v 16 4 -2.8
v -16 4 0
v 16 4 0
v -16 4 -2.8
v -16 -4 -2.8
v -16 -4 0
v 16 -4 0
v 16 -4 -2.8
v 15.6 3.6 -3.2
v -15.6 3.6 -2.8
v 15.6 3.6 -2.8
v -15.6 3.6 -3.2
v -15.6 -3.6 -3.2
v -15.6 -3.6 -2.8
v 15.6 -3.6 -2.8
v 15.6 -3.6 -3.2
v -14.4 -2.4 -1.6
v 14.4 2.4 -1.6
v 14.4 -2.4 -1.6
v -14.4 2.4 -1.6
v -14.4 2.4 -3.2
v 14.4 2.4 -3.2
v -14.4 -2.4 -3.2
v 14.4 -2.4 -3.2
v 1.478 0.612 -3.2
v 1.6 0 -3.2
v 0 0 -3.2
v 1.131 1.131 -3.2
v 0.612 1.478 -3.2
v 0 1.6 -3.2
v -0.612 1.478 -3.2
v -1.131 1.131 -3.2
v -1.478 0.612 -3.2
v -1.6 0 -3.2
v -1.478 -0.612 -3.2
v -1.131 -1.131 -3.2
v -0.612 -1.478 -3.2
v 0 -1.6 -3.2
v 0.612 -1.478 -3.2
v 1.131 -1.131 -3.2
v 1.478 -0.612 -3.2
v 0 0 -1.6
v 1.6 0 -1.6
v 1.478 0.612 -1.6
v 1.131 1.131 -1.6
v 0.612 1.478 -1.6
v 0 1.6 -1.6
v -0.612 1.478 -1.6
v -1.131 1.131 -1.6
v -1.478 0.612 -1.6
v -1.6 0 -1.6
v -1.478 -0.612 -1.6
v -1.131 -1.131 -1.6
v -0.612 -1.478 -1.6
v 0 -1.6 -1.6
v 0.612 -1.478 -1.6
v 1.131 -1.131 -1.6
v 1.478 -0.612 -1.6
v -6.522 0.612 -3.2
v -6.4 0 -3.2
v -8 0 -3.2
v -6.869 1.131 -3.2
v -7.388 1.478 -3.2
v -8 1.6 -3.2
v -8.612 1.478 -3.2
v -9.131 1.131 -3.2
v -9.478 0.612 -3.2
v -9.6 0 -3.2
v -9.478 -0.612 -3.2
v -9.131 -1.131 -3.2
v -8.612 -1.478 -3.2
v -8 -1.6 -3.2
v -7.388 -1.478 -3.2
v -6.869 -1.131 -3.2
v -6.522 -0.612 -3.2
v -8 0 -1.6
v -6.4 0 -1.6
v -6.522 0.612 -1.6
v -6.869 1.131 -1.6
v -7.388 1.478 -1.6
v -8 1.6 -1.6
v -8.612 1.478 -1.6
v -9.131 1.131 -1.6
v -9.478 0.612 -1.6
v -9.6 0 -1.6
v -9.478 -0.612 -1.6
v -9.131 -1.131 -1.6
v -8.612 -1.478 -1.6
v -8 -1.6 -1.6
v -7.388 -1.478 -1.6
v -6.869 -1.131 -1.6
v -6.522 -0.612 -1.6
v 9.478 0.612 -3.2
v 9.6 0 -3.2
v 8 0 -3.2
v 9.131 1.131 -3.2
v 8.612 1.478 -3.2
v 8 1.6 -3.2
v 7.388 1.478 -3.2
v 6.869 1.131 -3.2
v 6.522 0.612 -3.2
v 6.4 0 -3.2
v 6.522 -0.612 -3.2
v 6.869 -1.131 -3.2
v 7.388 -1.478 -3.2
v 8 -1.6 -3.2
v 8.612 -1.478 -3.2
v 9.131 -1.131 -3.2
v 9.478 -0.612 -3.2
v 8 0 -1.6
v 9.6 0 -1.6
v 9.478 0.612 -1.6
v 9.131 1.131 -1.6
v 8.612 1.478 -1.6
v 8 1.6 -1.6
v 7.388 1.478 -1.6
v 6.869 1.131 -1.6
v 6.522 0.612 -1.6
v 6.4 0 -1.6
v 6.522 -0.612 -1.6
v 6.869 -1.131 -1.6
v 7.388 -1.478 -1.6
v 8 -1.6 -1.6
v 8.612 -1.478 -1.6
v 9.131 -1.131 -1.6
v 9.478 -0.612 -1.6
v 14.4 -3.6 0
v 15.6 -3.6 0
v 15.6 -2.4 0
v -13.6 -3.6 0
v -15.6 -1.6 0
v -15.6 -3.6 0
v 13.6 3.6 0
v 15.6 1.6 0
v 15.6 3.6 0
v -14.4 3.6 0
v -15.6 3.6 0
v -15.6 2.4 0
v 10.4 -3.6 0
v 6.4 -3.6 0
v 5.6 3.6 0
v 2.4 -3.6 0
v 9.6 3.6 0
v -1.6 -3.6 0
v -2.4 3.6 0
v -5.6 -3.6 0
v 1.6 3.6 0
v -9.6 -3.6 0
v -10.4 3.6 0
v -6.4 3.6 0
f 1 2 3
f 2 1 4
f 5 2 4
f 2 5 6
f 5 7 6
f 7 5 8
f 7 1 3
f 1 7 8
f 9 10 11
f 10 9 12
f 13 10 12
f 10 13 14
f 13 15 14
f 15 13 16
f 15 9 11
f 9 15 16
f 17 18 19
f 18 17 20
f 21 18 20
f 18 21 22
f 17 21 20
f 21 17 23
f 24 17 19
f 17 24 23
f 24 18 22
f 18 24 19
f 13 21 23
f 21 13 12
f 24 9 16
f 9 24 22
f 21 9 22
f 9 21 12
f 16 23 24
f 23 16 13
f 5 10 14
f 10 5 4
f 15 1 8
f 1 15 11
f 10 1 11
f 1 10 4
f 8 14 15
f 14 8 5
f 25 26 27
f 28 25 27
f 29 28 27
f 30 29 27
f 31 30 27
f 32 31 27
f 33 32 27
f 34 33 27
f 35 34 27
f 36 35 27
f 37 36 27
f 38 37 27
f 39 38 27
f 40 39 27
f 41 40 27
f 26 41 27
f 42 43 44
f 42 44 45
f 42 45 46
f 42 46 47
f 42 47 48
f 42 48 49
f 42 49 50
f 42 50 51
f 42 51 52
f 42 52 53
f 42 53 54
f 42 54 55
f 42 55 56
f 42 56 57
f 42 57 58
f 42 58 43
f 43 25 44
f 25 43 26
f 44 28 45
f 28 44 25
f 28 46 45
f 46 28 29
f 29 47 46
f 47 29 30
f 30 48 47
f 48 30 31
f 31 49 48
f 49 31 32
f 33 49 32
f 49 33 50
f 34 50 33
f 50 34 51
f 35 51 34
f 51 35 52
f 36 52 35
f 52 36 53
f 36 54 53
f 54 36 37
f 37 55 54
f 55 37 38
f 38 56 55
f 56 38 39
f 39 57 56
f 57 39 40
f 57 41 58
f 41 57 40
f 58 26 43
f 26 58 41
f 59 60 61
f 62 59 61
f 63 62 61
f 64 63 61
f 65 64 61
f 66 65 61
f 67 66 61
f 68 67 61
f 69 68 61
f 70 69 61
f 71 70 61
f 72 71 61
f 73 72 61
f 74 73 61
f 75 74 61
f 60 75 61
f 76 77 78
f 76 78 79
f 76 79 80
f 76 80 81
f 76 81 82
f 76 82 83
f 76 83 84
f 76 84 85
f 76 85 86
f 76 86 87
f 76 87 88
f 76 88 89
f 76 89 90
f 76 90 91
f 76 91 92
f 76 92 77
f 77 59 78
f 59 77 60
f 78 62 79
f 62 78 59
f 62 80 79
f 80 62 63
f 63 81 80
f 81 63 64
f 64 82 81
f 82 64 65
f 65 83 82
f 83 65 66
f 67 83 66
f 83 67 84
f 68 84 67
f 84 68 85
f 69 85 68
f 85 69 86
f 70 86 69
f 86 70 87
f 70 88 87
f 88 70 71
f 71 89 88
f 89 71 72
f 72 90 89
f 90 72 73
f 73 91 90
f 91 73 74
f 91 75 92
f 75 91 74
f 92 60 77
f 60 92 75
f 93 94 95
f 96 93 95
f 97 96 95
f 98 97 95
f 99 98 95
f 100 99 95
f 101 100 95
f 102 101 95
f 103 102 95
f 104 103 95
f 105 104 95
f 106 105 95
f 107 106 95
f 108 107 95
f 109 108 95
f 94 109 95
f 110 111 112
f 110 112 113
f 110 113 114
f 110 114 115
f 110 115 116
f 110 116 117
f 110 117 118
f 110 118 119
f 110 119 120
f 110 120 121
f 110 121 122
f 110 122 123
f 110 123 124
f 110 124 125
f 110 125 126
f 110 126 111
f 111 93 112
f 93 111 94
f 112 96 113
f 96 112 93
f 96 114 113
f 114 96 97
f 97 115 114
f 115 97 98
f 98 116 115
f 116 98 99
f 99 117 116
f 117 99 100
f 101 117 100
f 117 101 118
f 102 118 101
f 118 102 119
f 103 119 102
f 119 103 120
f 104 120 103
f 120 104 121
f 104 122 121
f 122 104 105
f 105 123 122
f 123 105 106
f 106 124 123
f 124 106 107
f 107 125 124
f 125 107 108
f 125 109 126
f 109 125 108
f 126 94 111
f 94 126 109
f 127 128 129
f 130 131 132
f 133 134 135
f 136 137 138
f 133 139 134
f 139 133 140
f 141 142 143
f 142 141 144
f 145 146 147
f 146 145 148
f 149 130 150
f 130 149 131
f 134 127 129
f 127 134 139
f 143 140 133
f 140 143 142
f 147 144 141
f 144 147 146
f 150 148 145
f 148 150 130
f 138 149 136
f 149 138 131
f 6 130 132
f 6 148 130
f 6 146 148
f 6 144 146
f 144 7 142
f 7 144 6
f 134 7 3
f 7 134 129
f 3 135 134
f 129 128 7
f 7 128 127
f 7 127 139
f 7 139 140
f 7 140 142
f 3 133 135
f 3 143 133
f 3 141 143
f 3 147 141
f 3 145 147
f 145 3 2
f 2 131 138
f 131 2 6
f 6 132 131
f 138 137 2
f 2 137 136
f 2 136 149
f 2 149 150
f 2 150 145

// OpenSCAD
// file: ../p/4-4edge.scad
use <../lib.scad>
function ldraw_lib__4_4edge() = [
// 0 Circle 1.0
// 0 Name: 4-4edge.dat
// 0 Author: James Jessiman
// 0 !LDRAW_ORG Primitive UPDATE 2017-01
// 0 !LICENSE Licensed under CC BY 2.0 and CC BY 4.0 : see CAreadme.txt
// 
// 0 BFC CERTIFY CCW
  [0,"BFC","CERTIFY"],
  [0,"BFC","CCW"],
// 
// 0 !HISTORY 1998-12-15 [PTadmin] Official Update 1998-10
// 0 !HISTORY 2005-12-28 [PTadmin] Official Update 2005-01
// 0 !HISTORY 2007-06-24 [PTadmin] Header formatted for Contributor Agreement
// 0 !HISTORY 2008-07-01 [PTadmin] Official Update 2008-01
// 0 !HISTORY 2017-01-15 [Steffen] BFCed
// 0 !HISTORY 2017-12-30 [PTadmin] Official Update 2017-01
// 
// 
// 2 24 1 0 0 0.9239 0 0.3827
  [2,24,1,0,0,0.9239,0,0.3827],
// 2 24 0.9239 0 0.3827 0.7071 0 0.7071
  [2,24,0.9239,0,0.3827,0.7071,0,0.7071],
// 2 24 0.7071 0 0.7071 0.3827 0 0.9239
  [2,24,0.7071,0,0.7071,0.3827,0,0.9239],
// 2 24 0.3827 0 0.9239 0 0 1
  [2,24,0.3827,0,0.9239,0,0,1],
// 2 24 0 0 1 -0.3827 0 0.9239
  [2,24,0,0,1,-0.3827,0,0.9239],
// 2 24 -0.3827 0 0.9239 -0.7071 0 0.7071
  [2,24,-0.3827,0,0.9239,-0.7071,0,0.7071],
// 2 24 -0.7071 0 0.7071 -0.9239 0 0.3827
  [2,24,-0.7071,0,0.7071,-0.9239,0,0.3827],
// 2 24 -0.9239 0 0.3827 -1 0 -0
  [2,24,-0.9239,0,0.3827,-1,0,-0],
// 2 24 -1 0 -0 -0.9239 0 -0.3827
  [2,24,-1,0,-0,-0.9239,0,-0.3827],
// 2 24 -0.9239 0 -0.3827 -0.7071 0 -0.7071
  [2,24,-0.9239,0,-0.3827,-0.7071,0,-0.7071],
// 2 24 -0.7071 0 -0.7071 -0.3827 0 -0.9239
  [2,24,-0.7071,0,-0.7071,-0.3827,0,-0.9239],
// 2 24 -0.3827 0 -0.9239 0 0 -1
  [2,24,-0.3827,0,-0.9239,0,0,-1],
// 2 24 0 0 -1 0.3827 0 -0.9239
  [2,24,0,0,-1,0.3827,0,-0.9239],
// 2 24 0.3827 0 -0.9239 0.7071 0 -0.7071
  [2,24,0.3827,0,-0.9239,0.7071,0,-0.7071],
// 2 24 0.7071 0 -0.7071 0.9239 0 -0.3827
  [2,24,0.7071,0,-0.7071,0.9239,0,-0.3827],
// 2 24 0.9239 0 -0.3827 1 0 0
  [2,24,0.9239,0,-0.3827,1,0,0],
];
module ldraw_lib__4_4edge(step=0, col=false, unit=2/5, alt=false, line=0.2, solid=!$preview)
    makepoly(ldraw_lib__4_4edge(), step=step, col=col, unit=unit, alt=alt, line=line, solid=solid);
ldraw_lib__4_4edge(line=0.2);
// file: ../p/4-4disc.scad
use <../lib.scad>
function ldraw_lib__4_4disc() = [
// 0 Disc 1.0
// 0 Name: 4-4disc.dat
// 0 Author: James Jessiman
// 0 !LDRAW_ORG Primitive UPDATE 2002-02
// 0 !LICENSE Licensed under CC BY 2.0 and CC BY 4.0 : see CAreadme.txt
// 
// 0 BFC CERTIFY CCW
  [0,"BFC","CERTIFY"],
  [0,"BFC","CCW"],
// 
// 0 !HISTORY 1998-12-15 [PTadmin] Official Update 1998-10
// 0 !HISTORY 2002-03-23 [sbliss] Added BFC statement
// 0 !HISTORY 2002-04-25 [PTadmin] Official Update 2002-02
// 0 !HISTORY 2007-06-24 [PTadmin] Header formatted for Contributor Agreement
// 0 !HISTORY 2008-07-01 [PTadmin] Official Update 2008-01
// 
// 
// 3 16 0 0 0 1 0 0 0.9239 0 0.3827
  [3,16,0,0,0,1,0,0,0.9239,0,0.3827],
// 3 16 0 0 0 0.9239 0 0.3827 0.7071 0 0.7071
  [3,16,0,0,0,0.9239,0,0.3827,0.7071,0,0.7071],
// 3 16 0 0 0 0.7071 0 0.7071 0.3827 0 0.9239
  [3,16,0,0,0,0.7071,0,0.7071,0.3827,0,0.9239],
// 3 16 0 0 0 0.3827 0 0.9239 0 0 1
  [3,16,0,0,0,0.3827,0,0.9239,0,0,1],
// 3 16 0 0 0 0 0 1 -0.3827 0 0.9239
  [3,16,0,0,0,0,0,1,-0.3827,0,0.9239],
// 3 16 0 0 0 -0.3827 0 0.9239 -0.7071 0 0.7071
  [3,16,0,0,0,-0.3827,0,0.9239,-0.7071,0,0.7071],
// 3 16 0 0 0 -0.7071 0 0.7071 -0.9239 0 0.3827
  [3,16,0,0,0,-0.7071,0,0.7071,-0.9239,0,0.3827],
// 3 16 0 0 0 -0.9239 0 0.3827 -1 0 -0
  [3,16,0,0,0,-0.9239,0,0.3827,-1,0,-0],
// 3 16 0 0 0 -1 0 -0 -0.9239 0 -0.3827
  [3,16,0,0,0,-1,0,-0,-0.9239,0,-0.3827],
// 3 16 0 0 0 -0.9239 0 -0.3827 -0.7071 0 -0.7071
  [3,16,0,0,0,-0.9239,0,-0.3827,-0.7071,0,-0.7071],
// 3 16 0 0 0 -0.7071 0 -0.7071 -0.3827 0 -0.9239
  [3,16,0,0,0,-0.7071,0,-0.7071,-0.3827,0,-0.9239],
// 3 16 0 0 0 -0.3827 0 -0.9239 0 0 -1
  [3,16,0,0,0,-0.3827,0,-0.9239,0,0,-1],
// 3 16 0 0 0 0 0 -1 0.3827 0 -0.9239
  [3,16,0,0,0,0,0,-1,0.3827,0,-0.9239],
// 3 16 0 0 0 0.3827 0 -0.9239 0.7071 0 -0.7071
  [3,16,0,0,0,0.3827,0,-0.9239,0.7071,0,-0.7071],
// 3 16 0 0 0 0.7071 0 -0.7071 0.9239 0 -0.3827
  [3,16,0,0,0,0.7071,0,-0.7071,0.9239,0,-0.3827],
// 3 16 0 0 0 0.9239 0 -0.3827 1 0 0
  [3,16,0,0,0,0.9239,0,-0.3827,1,0,0],
// 0
];
module ldraw_lib__4_4disc(step=0, col=false, unit=2/5, alt=false, line=0.2, solid=!$preview)
    makepoly(ldraw_lib__4_4disc(), step=step, col=col, unit=unit, alt=alt, line=line, solid=solid);
ldraw_lib__4_4disc(line=0.2);
// file: ../p/4-4cyli.scad
use <../lib.scad>
$fa=1; $fs=0.2;
function ldraw_lib__4_4cyli(realsolid=false) = [
// 0 Cylinder 1.0
// 0 Name: 4-4cyli.dat
// 0 Author: James Jessiman
// 0 !LDRAW_ORG Primitive UPDATE 2005-01
// 0 !LICENSE Licensed under CC BY 2.0 and CC BY 4.0 : see CAreadme.txt
// 
// 0 BFC CERTIFY CCW
  [0,"BFC","CERTIFY"],
  [0,"BFC","CCW"],
// 
// 0 !HISTORY 1998-12-15 [PTadmin] Official Update 1998-10
// 0 !HISTORY 2002-03-23 [sbliss] Added BFC statement; merged headers from files in distributions LDraw 0.27 and Complete.
// 0 !HISTORY 2002-04-25 [PTadmin] Official Update 2002-02
// 0 !HISTORY 2004-12-14 [guyvivan] BFC CCW
// 0 !HISTORY 2005-12-28 [PTadmin] Official Update 2005-01
// 0 !HISTORY 2007-06-24 [PTadmin] Header formatted for Contributor Agreement
// 0 !HISTORY 2008-07-01 [PTadmin] Official Update 2008-01
// 
// 
// 4 16 1 1 0 0.9239 1 0.3827 0.9239 0 0.3827 1 0 0
  [4,16,1,1,0,0.9239,1,0.3827,0.9239,0,0.3827,1,0,0],
// 5 24 1 0 0 1 1 0 0.9239 0 0.3827 0.9239 0 -0.3827
  [5,24,1,0,0,1,1,0,0.9239,0,0.3827,0.9239,0,-0.3827],
// 4 16 0.9239 1 0.3827 0.7071 1 0.7071 0.7071 0 0.7071 0.9239 0 0.3827
  [4,16,0.9239,1,0.3827,0.7071,1,0.7071,0.7071,0,0.7071,0.9239,0,0.3827],
// 5 24 0.9239 0 0.3827 0.9239 1 0.3827 0.7071 0 0.7071 1 0 0
  [5,24,0.9239,0,0.3827,0.9239,1,0.3827,0.7071,0,0.7071,1,0,0],
// 4 16 0.7071 1 0.7071 0.3827 1 0.9239 0.3827 0 0.9239 0.7071 0 0.7071
  [4,16,0.7071,1,0.7071,0.3827,1,0.9239,0.3827,0,0.9239,0.7071,0,0.7071],
// 5 24 0.7071 0 0.7071 0.7071 1 0.7071 0.3827 0 0.9239 0.9239 0 0.3827
  [5,24,0.7071,0,0.7071,0.7071,1,0.7071,0.3827,0,0.9239,0.9239,0,0.3827],
// 4 16 0.3827 1 0.9239 0 1 1 0 0 1 0.3827 0 0.9239
  [4,16,0.3827,1,0.9239,0,1,1,0,0,1,0.3827,0,0.9239],
// 5 24 0.3827 0 0.9239 0.3827 1 0.9239 0 0 1 0.7071 0 0.7071
  [5,24,0.3827,0,0.9239,0.3827,1,0.9239,0,0,1,0.7071,0,0.7071],
// 4 16 0 1 1 -0.3827 1 0.9239 -0.3827 0 0.9239 0 0 1
  [4,16,0,1,1,-0.3827,1,0.9239,-0.3827,0,0.9239,0,0,1],
// 5 24 0 0 1 0 1 1 -0.3827 0 0.9239 0.3827 0 0.9239
  [5,24,0,0,1,0,1,1,-0.3827,0,0.9239,0.3827,0,0.9239],
// 4 16 -0.3827 1 0.9239 -0.7071 1 0.7071 -0.7071 0 0.7071 -0.3827 0 0.9239
  [4,16,-0.3827,1,0.9239,-0.7071,1,0.7071,-0.7071,0,0.7071,-0.3827,0,0.9239],
// 5 24 -0.3827 0 0.9239 -0.3827 1 0.9239 -0.7071 0 0.7071 0 0 1
  [5,24,-0.3827,0,0.9239,-0.3827,1,0.9239,-0.7071,0,0.7071,0,0,1],
// 4 16 -0.7071 1 0.7071 -0.9239 1 0.3827 -0.9239 0 0.3827 -0.7071 0 0.7071
  [4,16,-0.7071,1,0.7071,-0.9239,1,0.3827,-0.9239,0,0.3827,-0.7071,0,0.7071],
// 5 24 -0.7071 0 0.7071 -0.7071 1 0.7071 -0.9239 0 0.3827 -0.3827 0 0.9239
  [5,24,-0.7071,0,0.7071,-0.7071,1,0.7071,-0.9239,0,0.3827,-0.3827,0,0.9239],
// 4 16 -0.9239 1 0.3827 -1 1 0 -1 0 0 -0.9239 0 0.3827
  [4,16,-0.9239,1,0.3827,-1,1,0,-1,0,0,-0.9239,0,0.3827],
// 5 24 -0.9239 0 0.3827 -0.9239 1 0.3827 -1 0 0 -0.7071 0 0.7071
  [5,24,-0.9239,0,0.3827,-0.9239,1,0.3827,-1,0,0,-0.7071,0,0.7071],
// 4 16 -1 1 0 -0.9239 1 -0.3827 -0.9239 0 -0.3827 -1 0 0
  [4,16,-1,1,0,-0.9239,1,-0.3827,-0.9239,0,-0.3827,-1,0,0],
// 5 24 -1 0 0 -1 1 0 -0.9239 0 -0.3827 -0.9239 0 0.3827
  [5,24,-1,0,0,-1,1,0,-0.9239,0,-0.3827,-0.9239,0,0.3827],
// 4 16 -0.9239 1 -0.3827 -0.7071 1 -0.7071 -0.7071 0 -0.7071 -0.9239 0 -0.3827
  [4,16,-0.9239,1,-0.3827,-0.7071,1,-0.7071,-0.7071,0,-0.7071,-0.9239,0,-0.3827],
// 5 24 -0.9239 0 -0.3827 -0.9239 1 -0.3827 -0.7071 0 -0.7071 -1 0 0
  [5,24,-0.9239,0,-0.3827,-0.9239,1,-0.3827,-0.7071,0,-0.7071,-1,0,0],
// 4 16 -0.7071 1 -0.7071 -0.3827 1 -0.9239 -0.3827 0 -0.9239 -0.7071 0 -0.7071
  [4,16,-0.7071,1,-0.7071,-0.3827,1,-0.9239,-0.3827,0,-0.9239,-0.7071,0,-0.7071],
// 5 24 -0.7071 0 -0.7071 -0.7071 1 -0.7071 -0.3827 0 -0.9239 -0.9239 0 -0.3827
  [5,24,-0.7071,0,-0.7071,-0.7071,1,-0.7071,-0.3827,0,-0.9239,-0.9239,0,-0.3827],
// 4 16 -0.3827 1 -0.9239 0 1 -1 0 0 -1 -0.3827 0 -0.9239
  [4,16,-0.3827,1,-0.9239,0,1,-1,0,0,-1,-0.3827,0,-0.9239],
// 5 24 -0.3827 0 -0.9239 -0.3827 1 -0.9239 0 0 -1 -0.7071 0 -0.7071
  [5,24,-0.3827,0,-0.9239,-0.3827,1,-0.9239,0,0,-1,-0.7071,0,-0.7071],
// 4 16 0 1 -1 0.3827 1 -0.9239 0.3827 0 -0.9239 0 0 -1
  [4,16,0,1,-1,0.3827,1,-0.9239,0.3827,0,-0.9239,0,0,-1],
// 5 24 0 0 -1 0 1 -1 0.3827 0 -0.9239 -0.3827 0 -0.9239
  [5,24,0,0,-1,0,1,-1,0.3827,0,-0.9239,-0.3827,0,-0.9239],
// 4 16 0.3827 1 -0.9239 0.7071 1 -0.7071 0.7071 0 -0.7071 0.3827 0 -0.9239
  [4,16,0.3827,1,-0.9239,0.7071,1,-0.7071,0.7071,0,-0.7071,0.3827,0,-0.9239],
// 5 24 0.3827 0 -0.9239 0.3827 1 -0.9239 0.7071 0 -0.7071 0 0 -1
  [5,24,0.3827,0,-0.9239,0.3827,1,-0.9239,0.7071,0,-0.7071,0,0,-1],
// 4 16 0.7071 1 -0.7071 0.9239 1 -0.3827 0.9239 0 -0.3827 0.7071 0 -0.7071
  [4,16,0.7071,1,-0.7071,0.9239,1,-0.3827,0.9239,0,-0.3827,0.7071,0,-0.7071],
// 5 24 0.7071 0 -0.7071 0.7071 1 -0.7071 0.9239 0 -0.3827 0.3827 0 -0.9239
  [5,24,0.7071,0,-0.7071,0.7071,1,-0.7071,0.9239,0,-0.3827,0.3827,0,-0.9239],
// 4 16 0.9239 1 -0.3827 1 1 0 1 0 0 0.9239 0 -0.3827
  [4,16,0.9239,1,-0.3827,1,1,0,1,0,0,0.9239,0,-0.3827],
// 5 24 0.9239 0 -0.3827 0.9239 1 -0.3827 1 0 0 0.7071 0 -0.7071
  [5,24,0.9239,0,-0.3827,0.9239,1,-0.3827,1,0,0,0.7071,0,-0.7071],
// 0
];
module ldraw_lib__4_4cyli(step=0, col=false, unit=2/5, alt=false, line=0.2, solid=!$preview)
    makepoly(ldraw_lib__4_4cyli(solid), step=step, col=col, unit=unit, alt=alt, line=line, solid=solid);
ldraw_lib__4_4cyli(line=0.2);
// file: ../p/stud3.scad
use <../lib.scad>
use <4-4cyli.scad>
use <4-4disc.scad>
use <4-4edge.scad>
function ldraw_lib__stud3() = [
// 0 Stud Tube Solid
// 0 Name: stud3.dat
// 0 Author: James Jessiman
// 0 !LDRAW_ORG Primitive UPDATE 2012-01
// 0 !LICENSE Licensed under CC BY 4.0 : see CAreadme.txt
// 
// 0 BFC CERTIFY CCW
  [0,"BFC","CERTIFY"],
  [0,"BFC","CCW"],
// 
// 0 !HISTORY 2002-04-04 [sbliss] Modified for BFC compliance
// 0 !HISTORY 2002-04-25 [PTadmin] Official Update 2002-02
// 0 !HISTORY 2007-06-24 [PTadmin] Header formatted for Contributor Agreement
// 0 !HISTORY 2008-07-01 [PTadmin] Official Update 2008-01
// 0 !HISTORY 2012-02-16 [Philo] Changed to CCW
// 0 !HISTORY 2012-03-30 [PTadmin] Official Update 2012-01
// 
// 
// 1 16 0 -4 0 4 0 0 0 1 0 0 0 4 4-4edge.dat
  [1,16,0,-4,0,4,0,0,0,1,0,0,0,4, ldraw_lib__4_4edge()],
// 1 16 0 0 0 4 0 0 0 1 0 0 0 4 4-4edge.dat
  [1,16,0,0,0,4,0,0,0,1,0,0,0,4, ldraw_lib__4_4edge()],
// 1 16 0 -4 0 4 0 0 0 1 0 0 0 4 4-4disc.dat
  [1,16,0,-4,0,4,0,0,0,1,0,0,0,4, ldraw_lib__4_4disc()],
  [-1,16,0,0,0,4,0,0,0,-1,0,0,0,4, ldraw_lib__4_4disc()],
// 1 16 0 -4 0 4 0 0 0 4 0 0 0 4 4-4cyli.dat
  [1,16,0,-4,0,4,0,0,0,4,0,0,0,4, ldraw_lib__4_4cyli()],
];
module ldraw_lib__stud3(step=0, col=false, unit=2/5, alt=false, line=0.2, solid=!$preview)
    makepoly(ldraw_lib__stud3(), step=step, col=col, unit=unit, alt=alt, line=line, solid=solid);
ldraw_lib__stud3(line=0.2);
// file: ../p/box5.scad
use <../lib.scad>
function ldraw_lib__box5() = [
// 0 Box with 5 Faces and All Edges
// 0 Name: box5.dat
// 0 Author: James Jessiman
// 0 !LDRAW_ORG Primitive UPDATE 2012-01
// 0 !LICENSE Licensed under CC BY 2.0 and CC BY 4.0 : see CAreadme.txt
// 
// 0 BFC CERTIFY CCW
  [0,"BFC","CERTIFY"],
  [0,"BFC","CCW"],
// 
// 0 !HISTORY 2002-04-03 [sbliss] Modified for BFC compliance
// 0 !HISTORY 2002-04-25 [PTadmin] Official Update 2002-02
// 0 !HISTORY 2007-06-24 [PTadmin] Header formatted for Contributor Agreement
// 0 !HISTORY 2008-07-01 [PTadmin] Official Update 2008-01
// 0 !HISTORY 2012-02-16 [Philo] Changed to CCW
// 0 !HISTORY 2012-03-30 [PTadmin] Official Update 2012-01
// 
// 
// 2 24 1 1 1 -1 1 1
  [2,24,1,1,1,-1,1,1],
// 2 24 -1 1 1 -1 1 -1
  [2,24,-1,1,1,-1,1,-1],
// 2 24 -1 1 -1 1 1 -1
  [2,24,-1,1,-1,1,1,-1],
// 2 24 1 1 -1 1 1 1
  [2,24,1,1,-1,1,1,1],
// 2 24 1 0 1 -1 0 1
  [2,24,1,0,1,-1,0,1],
// 2 24 -1 0 1 -1 0 -1
  [2,24,-1,0,1,-1,0,-1],
// 2 24 -1 0 -1 1 0 -1
  [2,24,-1,0,-1,1,0,-1],
// 2 24 1 0 -1 1 0 1
  [2,24,1,0,-1,1,0,1],
// 2 24 1 0 1 1 1 1
  [2,24,1,0,1,1,1,1],
// 2 24 -1 0 1 -1 1 1
  [2,24,-1,0,1,-1,1,1],
// 2 24 1 0 -1 1 1 -1
  [2,24,1,0,-1,1,1,-1],
// 2 24 -1 0 -1 -1 1 -1
  [2,24,-1,0,-1,-1,1,-1],
// 4 16 -1 1 1 1 1 1 1 1 -1 -1 1 -1
  [4,16,-1,1,1,1,1,1,1,1,-1,-1,1,-1],
// 4 16 -1 1 1 -1 0 1 1 0 1 1 1 1
  [4,16,-1,1,1,-1,0,1,1,0,1,1,1,1],
// 4 16 -1 1 -1 -1 0 -1 -1 0 1 -1 1 1
  [4,16,-1,1,-1,-1,0,-1,-1,0,1,-1,1,1],
// 4 16 1 1 -1 1 0 -1 -1 0 -1 -1 1 -1
  [4,16,1,1,-1,1,0,-1,-1,0,-1,-1,1,-1],
// 4 16 1 1 1 1 0 1 1 0 -1 1 1 -1
  [4,16,1,1,1,1,0,1,1,0,-1,1,1,-1],
];
makepoly(ldraw_lib__box5(), line=0.2);
// file: ../p/box4.scad
use <../lib.scad>
function ldraw_lib__box4() = [
// 0 Box with 4 Faces (2 Parallel Pairs) and All Edges
// 0 Name: box4.dat
// 0 Author: James Jessiman
// 0 !LDRAW_ORG Primitive UPDATE 2012-01
// 0 !LICENSE Licensed under CC BY 4.0 : see CAreadme.txt
// 
// 0 BFC CERTIFY CCW
  [0,"BFC","CERTIFY"],
  [0,"BFC","CCW"],
// 
// 0 !HISTORY 2002-04-03 [sbliss] Modified for BFC compliance
// 0 !HISTORY 2002-04-25 [PTadmin] Official Update 2002-02
// 0 !HISTORY 2007-06-24 [PTadmin] Header formatted for Contributor Agreement
// 0 !HISTORY 2008-07-01 [PTadmin] Official Update 2008-01
// 0 !HISTORY 2012-02-16 [Philo] Changed to CCW
// 0 !HISTORY 2012-03-30 [PTadmin] Official Update 2012-01
// 
// 
// 2 24 1 1 1 -1 1 1
  [2,24,1,1,1,-1,1,1],
// 2 24 -1 1 1 -1 1 -1
  [2,24,-1,1,1,-1,1,-1],
// 2 24 -1 1 -1 1 1 -1
  [2,24,-1,1,-1,1,1,-1],
// 2 24 1 1 -1 1 1 1
  [2,24,1,1,-1,1,1,1],
// 2 24 1 0 1 -1 0 1
  [2,24,1,0,1,-1,0,1],
// 2 24 -1 0 1 -1 0 -1
  [2,24,-1,0,1,-1,0,-1],
// 2 24 -1 0 -1 1 0 -1
  [2,24,-1,0,-1,1,0,-1],
// 2 24 1 0 -1 1 0 1
  [2,24,1,0,-1,1,0,1],
// 2 24 1 0 1 1 1 1
  [2,24,1,0,1,1,1,1],
// 2 24 -1 0 1 -1 1 1
  [2,24,-1,0,1,-1,1,1],
// 2 24 1 0 -1 1 1 -1
  [2,24,1,0,-1,1,1,-1],
// 2 24 -1 0 -1 -1 1 -1
  [2,24,-1,0,-1,-1,1,-1],
// 4 16 -1 1 1 -1 0 1 1 0 1 1 1 1
  [4,16,-1,1,1,-1,0,1,1,0,1,1,1,1],
// 4 16 -1 1 -1 -1 0 -1 -1 0 1 -1 1 1
  [4,16,-1,1,-1,-1,0,-1,-1,0,1,-1,1,1],
// 4 16 1 1 -1 1 0 -1 -1 0 -1 -1 1 -1
  [4,16,1,1,-1,1,0,-1,-1,0,-1,-1,1,-1],
// 4 16 1 1 1 1 0 1 1 0 -1 1 1 -1
  [4,16,1,1,1,1,0,1,1,0,-1,1,1,-1],
];
module ldraw_lib__box4(step=0, col=false, unit=2/5, alt=false, line=0.2, solid=!$preview)
    makepoly(ldraw_lib__box4(), step=step, col=col, unit=unit, alt=alt, line=line, solid=solid);
ldraw_lib__box4(line=0.2);
// file: s/2431s01.scad
use <../../lib.scad>
use <../../p/box4.scad>
use <../../p/box5.scad>
use <../../p/stud3.scad>
function ldraw_lib__s__2431s01() = [
// 0 ~Tile  1 x  4 with Groove without Top Face
// 0 Name: s\2431s01.dat
// 0 Author: Santeri Piippo [arezey]
// 0 !LDRAW_ORG Subpart UPDATE 2010-02
// 0 !LICENSE Licensed under CC BY 2.0 and CC BY 4.0 : see CAreadme.txt
// 
// 0 BFC CERTIFY CCW
  [0,"BFC","CERTIFY"],
  [0,"BFC","CCW"],
// 
// 0 !HISTORY 2010-07-05 [PTadmin] Official Update 2010-02
// 
// 
// 1 16 0 0 0 40 0 0 0 7 0 0 0 10 box4.dat
  [1,16,0,0,0,40,0,0,0,7,0,0,0,10, ldraw_lib__box4()],
// 1 16 0 7 0 39 0 0 0 1 0 0 0 9 box4.dat
  [1,16,0,7,0,39,0,0,0,1,0,0,0,9, ldraw_lib__box4()],
// 0 BFC INVERTNEXT
  [0,"BFC","INVERTNEXT"],
// 1 16 0 8 0 36 0 0 0 -4 0 0 0 6 box5.dat
  [1,16,0,8,0,36,0,0,0,-4,0,0,0,6, ldraw_lib__box5()],
// 4 16 -39 8 9 -36 8 6 -36 8 -6 -39 8 -9
  [4,16,-39,8,9,-36,8,6,-36,8,-6,-39,8,-9],
// 4 16 39 8 -9 36 8 -6 36 8 6 39 8 9
  [4,16,39,8,-9,36,8,-6,36,8,6,39,8,9],
// 4 16 39 8 9 36 8 6 -36 8 6 -39 8 9
  [4,16,39,8,9,36,8,6,-36,8,6,-39,8,9],
// 4 16 -39 8 -9 -36 8 -6 36 8 -6 39 8 -9
  [4,16,-39,8,-9,-36,8,-6,36,8,-6,39,8,-9],
// 4 16 -40 7 10 -39 7 9 -39 7 -9 -40 7 -10
  [4,16,-40,7,10,-39,7,9,-39,7,-9,-40,7,-10],
// 4 16 40 7 -10 39 7 -9 39 7 9 40 7 10
  [4,16,40,7,-10,39,7,-9,39,7,9,40,7,10],
// 4 16 40 7 10 39 7 9 -39 7 9 -40 7 10
  [4,16,40,7,10,39,7,9,-39,7,9,-40,7,10],
// 4 16 -40 7 -10 -39 7 -9 39 7 -9 40 7 -10
  [4,16,-40,7,-10,-39,7,-9,39,7,-9,40,7,-10],
// 1 16 0 4 0 1 0 0 0 -1 0 0 0 1 stud3.dat
  [1,16,0,4,0,1,0,0,0,-1,0,0,0,1, ldraw_lib__stud3()],
// 1 16 -20 4 0 1 0 0 0 -1 0 0 0 1 stud3.dat
  [1,16,-20,4,0,1,0,0,0,-1,0,0,0,1, ldraw_lib__stud3()],
// 1 16 20 4 0 1 0 0 0 -1 0 0 0 1 stud3.dat
  [1,16,20,4,0,1,0,0,0,-1,0,0,0,1, ldraw_lib__stud3()],
// 0 //
];
makepoly(ldraw_lib__s__2431s01(), line=0.2);
// file: s/2431p02s03.scad
use <../../lib.scad>
function ldraw_lib__s__2431p02s03() = [
// 0 ~Tile  1 x  4 with Red Danger Stripes Pattern - Half Border
// 0 Name: s\2431p02s03.dat
// 0 Author: Marc Giraudet [Mad_Marc]
// 0 !LDRAW_ORG Subpart UPDATE 2024-06
// 0 !LICENSE Licensed under CC BY 4.0 : see CAreadme.txt
// 
// 0 BFC CERTIFY CCW
  [0,"BFC","CERTIFY"],
  [0,"BFC","CCW"],
// 
// 0 !HISTORY 2024-07-29 [OrionP] Official Update 2024-06
// 
// 3 16 -40 0 -10 -34 0 -9 -39 0 -9
  [3,16,-40,0,-10,-34,0,-9,-39,0,-9],
// 3 16 -40 0 -10 -24 0 -9 -34 0 -9
  [3,16,-40,0,-10,-24,0,-9,-34,0,-9],
// 3 16 -40 0 -10 -14 0 -9 -24 0 -9
  [3,16,-40,0,-10,-14,0,-9,-24,0,-9],
// 3 16 -40 0 -10 -4 0 -9 -14 0 -9
  [3,16,-40,0,-10,-4,0,-9,-14,0,-9],
// 4 16 -40 0 -10 40 0 -10 6 0 -9 -4 0 -9
  [4,16,-40,0,-10,40,0,-10,6,0,-9,-4,0,-9],
// 4 16 40 0 10 39 0 4 39 0 -6 40 0 -10
  [4,16,40,0,10,39,0,4,39,0,-6,40,0,-10],
// 3 16 40 0 10 39 0 9 39 0 4
  [3,16,40,0,10,39,0,9,39,0,4],
// 3 16 39 0 -6 39 0 -9 40 0 -10
  [3,16,39,0,-6,39,0,-9,40,0,-10],
// 3 16 40 0 -10 39 0 -9 36 0 -9
  [3,16,40,0,-10,39,0,-9,36,0,-9],
// 3 16 40 0 -10 36 0 -9 26 0 -9
  [3,16,40,0,-10,36,0,-9,26,0,-9],
// 3 16 40 0 -10 26 0 -9 16 0 -9
  [3,16,40,0,-10,26,0,-9,16,0,-9],
// 3 16 40 0 -10 16 0 -9 6 0 -9
  [3,16,40,0,-10,16,0,-9,6,0,-9],
];
module ldraw_lib__s__2431p02s03(step=0, col=false, unit=2/5, alt=false, line=0.2, solid=!$preview)
    makepoly(ldraw_lib__s__2431p02s03(), step=step, col=col, unit=unit, alt=alt, line=line, solid=solid);
ldraw_lib__s__2431p02s03(line=0.2);
// file: s/2431p02s02.scad
use <../../lib.scad>
function ldraw_lib__s__2431p02s02() = [
// 0 ~Tile  1 x  4 with Danger Stripes Red Pattern - Zag
// 0 Name: s\2431p02s02.dat
// 0 Author: Marc Giraudet [Mad_Marc]
// 0 !LDRAW_ORG Subpart UPDATE 2024-06
// 0 !LICENSE Licensed under CC BY 4.0 : see CAreadme.txt
// 
// 0 BFC CERTIFY CCW
  [0,"BFC","CERTIFY"],
  [0,"BFC","CCW"],
// 
// 0 !HISTORY 2024-07-29 [OrionP] Official Update 2024-06
// 
// 4 16 39 0 4 26 0 -9 36 0 -9 39 0 -6
  [4,16,39,0,4,26,0,-9,36,0,-9,39,0,-6],
// 4 16 24 0 9 6 0 -9 16 0 -9 34 0 9
  [4,16,24,0,9,6,0,-9,16,0,-9,34,0,9],
// 4 16 4 0 9 -14 0 -9 -4 0 -9 14 0 9
  [4,16,4,0,9,-14,0,-9,-4,0,-9,14,0,9],
// 4 16 -16 0 9 -34 0 -9 -24 0 -9 -6 0 9
  [4,16,-16,0,9,-34,0,-9,-24,0,-9,-6,0,9],
// 4 16 -36 0 9 -39 0 6 -39 0 -4 -26 0 9
  [4,16,-36,0,9,-39,0,6,-39,0,-4,-26,0,9],
];
module ldraw_lib__s__2431p02s02(step=0, col=false, unit=2/5, alt=false, line=0.2, solid=!$preview)
    makepoly(ldraw_lib__s__2431p02s02(), step=step, col=col, unit=unit, alt=alt, line=line, solid=solid);
ldraw_lib__s__2431p02s02(line=0.2);
// file: s/2431p02s01.scad
use <../../lib.scad>
function ldraw_lib__s__2431p02s01() = [
// 0 ~Tile  1 x  4 with Danger Stripes Red Pattern - Zig
// 0 Name: s\2431p02s01.dat
// 0 Author: Marc Giraudet [Mad_Marc]
// 0 !LDRAW_ORG Subpart UPDATE 2024-06
// 0 !LICENSE Licensed under CC BY 4.0 : see CAreadme.txt
// 
// 0 BFC CERTIFY CCW
  [0,"BFC","CERTIFY"],
  [0,"BFC","CCW"],
// 
// 0 !HISTORY 2024-07-29 [OrionP] Official Update 2024-06
// 
// 3 16 36 0 -9 39 0 -9 39 0 -6
  [3,16,36,0,-9,39,0,-9,39,0,-6],
// 3 16 -34 0 -9 -39 0 -4 -39 0 -9
  [3,16,-34,0,-9,-39,0,-4,-39,0,-9],
// 3 16 34 0 9 39 0 4 39 0 9
  [3,16,34,0,9,39,0,4,39,0,9],
// 3 16 -36 0 9 -39 0 9 -39 0 6
  [3,16,-36,0,9,-39,0,9,-39,0,6],
// 4 16 34 0 9 16 0 -9 26 0 -9 39 0 4
  [4,16,34,0,9,16,0,-9,26,0,-9,39,0,4],
// 4 16 14 0 9 -4 0 -9 6 0 -9 24 0 9
  [4,16,14,0,9,-4,0,-9,6,0,-9,24,0,9],
// 4 16 -6 0 9 -24 0 -9 -14 0 -9 4 0 9
  [4,16,-6,0,9,-24,0,-9,-14,0,-9,4,0,9],
// 4 16 -39 0 -4 -34 0 -9 -16 0 9 -26 0 9
  [4,16,-39,0,-4,-34,0,-9,-16,0,9,-26,0,9],
];
module ldraw_lib__s__2431p02s01(step=0, col=false, unit=2/5, alt=false, line=0.2, solid=!$preview)
    makepoly(ldraw_lib__s__2431p02s01(), step=step, col=col, unit=unit, alt=alt, line=line, solid=solid);
ldraw_lib__s__2431p02s01(line=0.2);
// main file
use <../lib.scad>
use <s/2431p02s01.scad>
use <s/2431p02s02.scad>
use <s/2431p02s03.scad>
use <s/2431s01.scad>
function ldraw_lib__2431p53() = [
// 0 Tile  1 x  4 with Red Danger Stripes Type 2 Pattern
// 0 Name: 2431p53.dat
// 0 Author: Philippe Hurbain [Philo]
// 0 !LDRAW_ORG Part UPDATE 2024-06
// 0 !LICENSE Licensed under CC BY 4.0 : see CAreadme.txt
// 
// 0 BFC CERTIFY CCW
  [0,"BFC","CERTIFY"],
  [0,"BFC","CCW"],
// 
// 0 !KEYWORDS Bricklink 2431pb745, Rebrickable 2431pr0157, Set 60252
// 
// 0 !HISTORY 2024-07-20 [MagFors] Used pattern subfiles
// 0 !HISTORY 2024-07-29 [OrionP] Official Update 2024-06
// 
// 1 16 0 0 0 1 0 0 0 1 0 0 0 1 s\2431s01.dat
  [1,16,0,0,0,1,0,0,0,1,0,0,0,1, ldraw_lib__s__2431s01()],
// 1 16 0 0 0 1 0 0 0 1 0 0 0 1 s\2431p02s01.dat
  [1,16,0,0,0,1,0,0,0,1,0,0,0,1, ldraw_lib__s__2431p02s01()],
// 1 4 0 0 0 1 0 0 0 1 0 0 0 1 s\2431p02s02.dat
  [1,4,0,0,0,1,0,0,0,1,0,0,0,1, ldraw_lib__s__2431p02s02()],
// 1 16 0 0 0 1 0 0 0 1 0 0 0 1 s\2431p02s03.dat
  [1,16,0,0,0,1,0,0,0,1,0,0,0,1, ldraw_lib__s__2431p02s03()],
// 1 16 0 0 0 -1 0 0 0 1 0 0 0 -1 s\2431p02s03.dat
  [1,16,0,0,0,-1,0,0,0,1,0,0,0,-1, ldraw_lib__s__2431p02s03()],
// 
];
module ldraw_lib__2431p53(step=0, col=false, unit=2/5, alt=false, line=0.2, solid=!$preview)
    makepoly(ldraw_lib__2431p53(), step=step, col=col, unit=unit, alt=alt, line=line, solid=solid);
ldraw_lib__2431p53(line=0.2);
